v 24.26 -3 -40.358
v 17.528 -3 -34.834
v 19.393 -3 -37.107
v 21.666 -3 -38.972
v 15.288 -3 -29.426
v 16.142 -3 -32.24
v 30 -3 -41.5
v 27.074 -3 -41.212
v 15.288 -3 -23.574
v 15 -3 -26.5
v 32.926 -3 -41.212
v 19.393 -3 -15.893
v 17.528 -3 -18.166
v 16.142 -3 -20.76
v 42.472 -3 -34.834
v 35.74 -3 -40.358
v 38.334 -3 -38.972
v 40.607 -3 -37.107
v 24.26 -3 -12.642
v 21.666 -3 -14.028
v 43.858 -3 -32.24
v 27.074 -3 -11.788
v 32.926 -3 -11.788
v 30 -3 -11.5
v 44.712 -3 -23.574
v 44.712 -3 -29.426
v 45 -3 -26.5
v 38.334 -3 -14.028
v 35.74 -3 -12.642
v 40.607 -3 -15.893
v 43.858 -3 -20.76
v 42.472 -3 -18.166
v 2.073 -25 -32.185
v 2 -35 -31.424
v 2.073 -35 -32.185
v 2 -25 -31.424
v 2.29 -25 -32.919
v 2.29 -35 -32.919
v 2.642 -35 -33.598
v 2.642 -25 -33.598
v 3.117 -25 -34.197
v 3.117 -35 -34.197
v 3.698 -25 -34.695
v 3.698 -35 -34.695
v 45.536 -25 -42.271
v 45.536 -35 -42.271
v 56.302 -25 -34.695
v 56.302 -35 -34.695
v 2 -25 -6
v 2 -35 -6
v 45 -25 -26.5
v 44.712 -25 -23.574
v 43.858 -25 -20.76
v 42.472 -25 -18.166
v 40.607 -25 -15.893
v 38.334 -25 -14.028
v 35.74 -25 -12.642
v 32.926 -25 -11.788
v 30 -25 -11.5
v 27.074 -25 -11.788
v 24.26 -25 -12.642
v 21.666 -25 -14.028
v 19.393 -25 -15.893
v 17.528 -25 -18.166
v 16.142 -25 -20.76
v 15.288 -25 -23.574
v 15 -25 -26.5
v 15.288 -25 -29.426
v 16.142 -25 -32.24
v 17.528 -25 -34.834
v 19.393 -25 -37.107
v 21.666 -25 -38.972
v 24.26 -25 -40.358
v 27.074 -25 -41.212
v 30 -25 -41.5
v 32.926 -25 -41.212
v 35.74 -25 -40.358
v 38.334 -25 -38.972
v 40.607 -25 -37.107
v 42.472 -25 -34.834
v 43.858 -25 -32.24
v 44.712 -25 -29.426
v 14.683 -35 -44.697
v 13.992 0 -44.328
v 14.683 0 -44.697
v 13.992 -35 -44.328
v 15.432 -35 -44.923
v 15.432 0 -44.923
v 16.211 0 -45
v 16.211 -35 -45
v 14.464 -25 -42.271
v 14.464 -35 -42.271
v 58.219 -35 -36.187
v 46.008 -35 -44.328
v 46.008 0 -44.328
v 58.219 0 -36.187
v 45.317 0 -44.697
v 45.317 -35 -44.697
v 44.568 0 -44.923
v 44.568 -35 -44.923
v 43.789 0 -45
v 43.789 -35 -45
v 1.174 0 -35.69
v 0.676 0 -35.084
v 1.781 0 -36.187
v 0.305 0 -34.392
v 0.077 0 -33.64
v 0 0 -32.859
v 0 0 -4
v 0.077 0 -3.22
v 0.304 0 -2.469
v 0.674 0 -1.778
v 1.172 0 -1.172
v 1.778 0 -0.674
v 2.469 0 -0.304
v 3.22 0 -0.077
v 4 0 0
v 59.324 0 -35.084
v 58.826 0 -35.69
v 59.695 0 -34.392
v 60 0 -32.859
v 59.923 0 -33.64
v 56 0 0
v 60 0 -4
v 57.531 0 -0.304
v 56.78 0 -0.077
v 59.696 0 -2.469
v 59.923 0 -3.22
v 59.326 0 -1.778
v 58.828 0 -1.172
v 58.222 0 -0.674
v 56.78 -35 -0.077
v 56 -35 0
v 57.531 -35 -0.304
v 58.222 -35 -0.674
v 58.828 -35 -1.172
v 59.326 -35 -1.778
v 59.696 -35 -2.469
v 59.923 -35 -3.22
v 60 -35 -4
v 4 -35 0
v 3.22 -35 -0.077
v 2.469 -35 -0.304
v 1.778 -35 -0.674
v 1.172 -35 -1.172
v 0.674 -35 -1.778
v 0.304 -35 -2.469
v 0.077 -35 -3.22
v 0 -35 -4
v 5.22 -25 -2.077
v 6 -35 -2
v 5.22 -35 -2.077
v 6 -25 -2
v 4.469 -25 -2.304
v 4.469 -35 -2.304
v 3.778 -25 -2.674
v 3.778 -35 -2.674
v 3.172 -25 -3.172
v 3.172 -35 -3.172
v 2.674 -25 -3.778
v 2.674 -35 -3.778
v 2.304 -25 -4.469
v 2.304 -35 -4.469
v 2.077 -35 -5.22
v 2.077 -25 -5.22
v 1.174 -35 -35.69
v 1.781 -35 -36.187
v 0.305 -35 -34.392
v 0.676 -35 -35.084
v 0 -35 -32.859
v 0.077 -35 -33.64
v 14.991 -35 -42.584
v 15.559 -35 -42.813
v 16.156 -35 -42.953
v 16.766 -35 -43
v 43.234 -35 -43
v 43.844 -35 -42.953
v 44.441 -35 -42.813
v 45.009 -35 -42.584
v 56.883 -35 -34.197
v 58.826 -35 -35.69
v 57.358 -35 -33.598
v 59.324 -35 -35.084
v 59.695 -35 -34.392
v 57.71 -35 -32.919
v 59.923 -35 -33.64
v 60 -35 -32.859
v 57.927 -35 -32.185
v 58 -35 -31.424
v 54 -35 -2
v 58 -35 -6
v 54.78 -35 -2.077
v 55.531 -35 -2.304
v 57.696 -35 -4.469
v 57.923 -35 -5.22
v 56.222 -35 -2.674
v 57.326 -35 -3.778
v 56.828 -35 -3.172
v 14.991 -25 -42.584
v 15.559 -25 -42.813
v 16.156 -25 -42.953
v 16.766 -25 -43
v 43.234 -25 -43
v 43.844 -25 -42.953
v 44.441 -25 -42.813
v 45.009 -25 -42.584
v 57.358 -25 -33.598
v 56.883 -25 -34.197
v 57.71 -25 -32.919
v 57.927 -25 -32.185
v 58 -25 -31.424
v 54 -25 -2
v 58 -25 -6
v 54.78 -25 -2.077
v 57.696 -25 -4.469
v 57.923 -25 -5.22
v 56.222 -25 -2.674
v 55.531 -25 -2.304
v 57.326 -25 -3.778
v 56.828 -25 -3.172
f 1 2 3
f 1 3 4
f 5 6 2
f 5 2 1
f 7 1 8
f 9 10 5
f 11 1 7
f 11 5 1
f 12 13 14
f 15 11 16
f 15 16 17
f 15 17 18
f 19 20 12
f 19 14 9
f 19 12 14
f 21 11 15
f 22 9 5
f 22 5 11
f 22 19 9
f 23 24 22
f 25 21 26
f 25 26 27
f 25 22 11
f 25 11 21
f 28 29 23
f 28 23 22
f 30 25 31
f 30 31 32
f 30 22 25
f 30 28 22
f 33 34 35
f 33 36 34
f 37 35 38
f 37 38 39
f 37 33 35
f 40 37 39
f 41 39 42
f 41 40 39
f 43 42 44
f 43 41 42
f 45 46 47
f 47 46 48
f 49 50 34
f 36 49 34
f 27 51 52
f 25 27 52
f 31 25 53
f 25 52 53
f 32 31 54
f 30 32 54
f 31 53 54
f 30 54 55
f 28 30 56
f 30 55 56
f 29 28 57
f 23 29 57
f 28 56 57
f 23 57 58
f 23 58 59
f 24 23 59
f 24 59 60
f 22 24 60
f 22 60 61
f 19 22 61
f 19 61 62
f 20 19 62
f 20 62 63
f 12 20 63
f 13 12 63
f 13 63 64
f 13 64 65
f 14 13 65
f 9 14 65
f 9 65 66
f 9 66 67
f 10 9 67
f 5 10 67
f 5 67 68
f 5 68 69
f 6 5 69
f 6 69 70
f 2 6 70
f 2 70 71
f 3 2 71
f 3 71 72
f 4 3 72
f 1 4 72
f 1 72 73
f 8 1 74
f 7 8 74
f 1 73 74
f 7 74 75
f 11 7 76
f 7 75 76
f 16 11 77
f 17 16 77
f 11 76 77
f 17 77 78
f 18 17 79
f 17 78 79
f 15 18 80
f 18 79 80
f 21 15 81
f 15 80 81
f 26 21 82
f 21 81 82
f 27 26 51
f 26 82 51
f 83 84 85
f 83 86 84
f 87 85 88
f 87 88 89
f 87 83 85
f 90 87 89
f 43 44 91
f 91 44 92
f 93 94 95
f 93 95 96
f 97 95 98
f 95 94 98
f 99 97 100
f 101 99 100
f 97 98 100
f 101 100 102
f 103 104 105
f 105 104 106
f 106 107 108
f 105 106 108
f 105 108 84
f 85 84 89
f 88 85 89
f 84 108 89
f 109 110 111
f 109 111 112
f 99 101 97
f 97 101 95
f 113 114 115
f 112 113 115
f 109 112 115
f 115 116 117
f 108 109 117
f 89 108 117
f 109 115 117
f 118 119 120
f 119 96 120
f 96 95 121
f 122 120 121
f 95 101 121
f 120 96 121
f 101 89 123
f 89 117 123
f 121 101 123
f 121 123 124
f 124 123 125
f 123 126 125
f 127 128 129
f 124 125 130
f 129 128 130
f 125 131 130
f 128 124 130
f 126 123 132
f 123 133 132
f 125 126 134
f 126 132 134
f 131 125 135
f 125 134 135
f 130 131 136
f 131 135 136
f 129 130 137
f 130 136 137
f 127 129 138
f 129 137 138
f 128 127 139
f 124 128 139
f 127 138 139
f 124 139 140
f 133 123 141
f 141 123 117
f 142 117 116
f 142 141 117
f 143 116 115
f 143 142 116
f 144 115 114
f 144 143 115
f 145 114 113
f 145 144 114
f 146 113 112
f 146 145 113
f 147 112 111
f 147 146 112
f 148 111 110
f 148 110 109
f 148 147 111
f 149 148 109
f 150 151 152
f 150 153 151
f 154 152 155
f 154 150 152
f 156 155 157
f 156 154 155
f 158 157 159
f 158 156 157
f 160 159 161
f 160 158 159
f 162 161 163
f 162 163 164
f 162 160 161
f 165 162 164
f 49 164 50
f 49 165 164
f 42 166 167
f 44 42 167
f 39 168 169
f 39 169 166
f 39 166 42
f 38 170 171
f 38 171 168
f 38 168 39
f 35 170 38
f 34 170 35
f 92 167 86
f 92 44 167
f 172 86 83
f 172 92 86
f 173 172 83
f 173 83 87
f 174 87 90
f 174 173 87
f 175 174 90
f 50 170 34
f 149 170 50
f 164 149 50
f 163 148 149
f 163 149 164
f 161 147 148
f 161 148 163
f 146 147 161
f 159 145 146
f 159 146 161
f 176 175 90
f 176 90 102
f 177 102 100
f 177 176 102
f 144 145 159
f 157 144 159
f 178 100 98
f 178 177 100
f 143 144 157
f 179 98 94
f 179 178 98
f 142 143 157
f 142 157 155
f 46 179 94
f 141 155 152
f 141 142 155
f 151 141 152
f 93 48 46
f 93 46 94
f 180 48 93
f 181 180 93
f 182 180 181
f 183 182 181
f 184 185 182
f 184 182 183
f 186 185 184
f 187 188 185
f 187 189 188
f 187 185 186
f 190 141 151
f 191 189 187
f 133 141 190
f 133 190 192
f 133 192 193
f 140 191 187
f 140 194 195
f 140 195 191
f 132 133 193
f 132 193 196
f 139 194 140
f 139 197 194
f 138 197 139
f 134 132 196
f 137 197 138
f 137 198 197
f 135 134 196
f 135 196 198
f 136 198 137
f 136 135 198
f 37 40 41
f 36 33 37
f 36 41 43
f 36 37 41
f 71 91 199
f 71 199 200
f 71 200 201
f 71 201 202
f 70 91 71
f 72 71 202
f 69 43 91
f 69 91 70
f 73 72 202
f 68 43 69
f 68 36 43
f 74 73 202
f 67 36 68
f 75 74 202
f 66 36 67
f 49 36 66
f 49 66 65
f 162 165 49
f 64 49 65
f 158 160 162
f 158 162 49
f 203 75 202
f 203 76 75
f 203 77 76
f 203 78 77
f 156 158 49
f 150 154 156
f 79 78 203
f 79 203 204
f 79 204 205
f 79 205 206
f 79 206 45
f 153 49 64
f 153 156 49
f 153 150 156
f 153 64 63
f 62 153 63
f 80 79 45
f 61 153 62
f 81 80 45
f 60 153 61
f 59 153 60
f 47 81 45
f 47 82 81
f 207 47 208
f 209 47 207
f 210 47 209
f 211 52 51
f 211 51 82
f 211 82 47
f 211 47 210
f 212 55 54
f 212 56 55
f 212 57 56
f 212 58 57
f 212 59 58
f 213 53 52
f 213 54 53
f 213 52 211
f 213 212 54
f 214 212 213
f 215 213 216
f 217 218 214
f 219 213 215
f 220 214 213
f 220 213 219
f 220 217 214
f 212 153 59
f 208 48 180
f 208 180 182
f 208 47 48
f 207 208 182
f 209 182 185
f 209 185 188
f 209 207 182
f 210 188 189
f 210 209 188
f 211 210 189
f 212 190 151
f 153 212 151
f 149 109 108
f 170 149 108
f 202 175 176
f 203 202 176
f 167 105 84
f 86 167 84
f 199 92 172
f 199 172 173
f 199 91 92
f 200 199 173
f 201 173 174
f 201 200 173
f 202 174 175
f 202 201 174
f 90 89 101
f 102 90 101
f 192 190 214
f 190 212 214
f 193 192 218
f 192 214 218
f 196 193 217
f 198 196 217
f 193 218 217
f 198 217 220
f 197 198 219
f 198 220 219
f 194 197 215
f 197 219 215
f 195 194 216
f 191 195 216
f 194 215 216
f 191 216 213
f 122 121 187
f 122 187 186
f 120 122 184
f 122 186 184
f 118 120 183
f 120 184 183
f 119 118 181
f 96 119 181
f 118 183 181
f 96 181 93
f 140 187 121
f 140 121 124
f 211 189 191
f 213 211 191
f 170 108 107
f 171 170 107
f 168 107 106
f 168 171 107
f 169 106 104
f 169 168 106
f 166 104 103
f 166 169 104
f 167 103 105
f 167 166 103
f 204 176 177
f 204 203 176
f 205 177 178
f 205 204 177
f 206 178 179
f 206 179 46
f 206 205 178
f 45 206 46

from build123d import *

# Parameters (mm, degrees)
F1_DEPTH = 35
F2_R     = 15
F3_DEPTH = 10
F4_DEPTH = 32
F5_R     = 4


with BuildPart() as f1:
    # F0 (on Front) → F1 (new body)
    with BuildSketch(Plane.XZ):
        Polygon((60, 0), (0, 0), (0, -35), (15, -45), (45, -45), (60, -35), align=None)
    extrude(amount=F1_DEPTH)

    # F2 (on face) → F3 (cut)
    with BuildSketch(Plane.XZ.offset(35)):
        Polygon((58, -2), (2, -2), (2, -33.5), (15.5, -43), (30, -43), (44.5, -43), (58, -33.5), align=None)
        with Locations((30, -26.5)):
            Circle(F2_R, mode=Mode.SUBTRACT)
    extrude(amount=-F3_DEPTH, mode=Mode.SUBTRACT)

    # F4 (cut): faces of the model
    f4_faces = [f1.faces().sort_by_distance(p)[0] for p in [
        (30, -35, -26.5),
        (30, -35, -26.5),
    ]]
    extrude(f4_faces, amount=-F4_DEPTH, mode=Mode.SUBTRACT)

    # F5
    f5_edges = [f1.edges().sort_by_distance(p)[0] for p in [
        (60, -17.5, 0),
        (60, -17.5, -35),
        (0, -17.5, 0),
        (45, -17.5, -45),
        (15, -17.5, -45),
        (0, -17.5, -35),
        (2, -30, -33.5),
        (44.5, -30, -43),
        (15.5, -30, -43),
        (58, -30, -33.5),
        (58, -30, -2),
        (2, -30, -2),
    ]]
    fillet(f5_edges, radius=F5_R)


solid = f1.part
